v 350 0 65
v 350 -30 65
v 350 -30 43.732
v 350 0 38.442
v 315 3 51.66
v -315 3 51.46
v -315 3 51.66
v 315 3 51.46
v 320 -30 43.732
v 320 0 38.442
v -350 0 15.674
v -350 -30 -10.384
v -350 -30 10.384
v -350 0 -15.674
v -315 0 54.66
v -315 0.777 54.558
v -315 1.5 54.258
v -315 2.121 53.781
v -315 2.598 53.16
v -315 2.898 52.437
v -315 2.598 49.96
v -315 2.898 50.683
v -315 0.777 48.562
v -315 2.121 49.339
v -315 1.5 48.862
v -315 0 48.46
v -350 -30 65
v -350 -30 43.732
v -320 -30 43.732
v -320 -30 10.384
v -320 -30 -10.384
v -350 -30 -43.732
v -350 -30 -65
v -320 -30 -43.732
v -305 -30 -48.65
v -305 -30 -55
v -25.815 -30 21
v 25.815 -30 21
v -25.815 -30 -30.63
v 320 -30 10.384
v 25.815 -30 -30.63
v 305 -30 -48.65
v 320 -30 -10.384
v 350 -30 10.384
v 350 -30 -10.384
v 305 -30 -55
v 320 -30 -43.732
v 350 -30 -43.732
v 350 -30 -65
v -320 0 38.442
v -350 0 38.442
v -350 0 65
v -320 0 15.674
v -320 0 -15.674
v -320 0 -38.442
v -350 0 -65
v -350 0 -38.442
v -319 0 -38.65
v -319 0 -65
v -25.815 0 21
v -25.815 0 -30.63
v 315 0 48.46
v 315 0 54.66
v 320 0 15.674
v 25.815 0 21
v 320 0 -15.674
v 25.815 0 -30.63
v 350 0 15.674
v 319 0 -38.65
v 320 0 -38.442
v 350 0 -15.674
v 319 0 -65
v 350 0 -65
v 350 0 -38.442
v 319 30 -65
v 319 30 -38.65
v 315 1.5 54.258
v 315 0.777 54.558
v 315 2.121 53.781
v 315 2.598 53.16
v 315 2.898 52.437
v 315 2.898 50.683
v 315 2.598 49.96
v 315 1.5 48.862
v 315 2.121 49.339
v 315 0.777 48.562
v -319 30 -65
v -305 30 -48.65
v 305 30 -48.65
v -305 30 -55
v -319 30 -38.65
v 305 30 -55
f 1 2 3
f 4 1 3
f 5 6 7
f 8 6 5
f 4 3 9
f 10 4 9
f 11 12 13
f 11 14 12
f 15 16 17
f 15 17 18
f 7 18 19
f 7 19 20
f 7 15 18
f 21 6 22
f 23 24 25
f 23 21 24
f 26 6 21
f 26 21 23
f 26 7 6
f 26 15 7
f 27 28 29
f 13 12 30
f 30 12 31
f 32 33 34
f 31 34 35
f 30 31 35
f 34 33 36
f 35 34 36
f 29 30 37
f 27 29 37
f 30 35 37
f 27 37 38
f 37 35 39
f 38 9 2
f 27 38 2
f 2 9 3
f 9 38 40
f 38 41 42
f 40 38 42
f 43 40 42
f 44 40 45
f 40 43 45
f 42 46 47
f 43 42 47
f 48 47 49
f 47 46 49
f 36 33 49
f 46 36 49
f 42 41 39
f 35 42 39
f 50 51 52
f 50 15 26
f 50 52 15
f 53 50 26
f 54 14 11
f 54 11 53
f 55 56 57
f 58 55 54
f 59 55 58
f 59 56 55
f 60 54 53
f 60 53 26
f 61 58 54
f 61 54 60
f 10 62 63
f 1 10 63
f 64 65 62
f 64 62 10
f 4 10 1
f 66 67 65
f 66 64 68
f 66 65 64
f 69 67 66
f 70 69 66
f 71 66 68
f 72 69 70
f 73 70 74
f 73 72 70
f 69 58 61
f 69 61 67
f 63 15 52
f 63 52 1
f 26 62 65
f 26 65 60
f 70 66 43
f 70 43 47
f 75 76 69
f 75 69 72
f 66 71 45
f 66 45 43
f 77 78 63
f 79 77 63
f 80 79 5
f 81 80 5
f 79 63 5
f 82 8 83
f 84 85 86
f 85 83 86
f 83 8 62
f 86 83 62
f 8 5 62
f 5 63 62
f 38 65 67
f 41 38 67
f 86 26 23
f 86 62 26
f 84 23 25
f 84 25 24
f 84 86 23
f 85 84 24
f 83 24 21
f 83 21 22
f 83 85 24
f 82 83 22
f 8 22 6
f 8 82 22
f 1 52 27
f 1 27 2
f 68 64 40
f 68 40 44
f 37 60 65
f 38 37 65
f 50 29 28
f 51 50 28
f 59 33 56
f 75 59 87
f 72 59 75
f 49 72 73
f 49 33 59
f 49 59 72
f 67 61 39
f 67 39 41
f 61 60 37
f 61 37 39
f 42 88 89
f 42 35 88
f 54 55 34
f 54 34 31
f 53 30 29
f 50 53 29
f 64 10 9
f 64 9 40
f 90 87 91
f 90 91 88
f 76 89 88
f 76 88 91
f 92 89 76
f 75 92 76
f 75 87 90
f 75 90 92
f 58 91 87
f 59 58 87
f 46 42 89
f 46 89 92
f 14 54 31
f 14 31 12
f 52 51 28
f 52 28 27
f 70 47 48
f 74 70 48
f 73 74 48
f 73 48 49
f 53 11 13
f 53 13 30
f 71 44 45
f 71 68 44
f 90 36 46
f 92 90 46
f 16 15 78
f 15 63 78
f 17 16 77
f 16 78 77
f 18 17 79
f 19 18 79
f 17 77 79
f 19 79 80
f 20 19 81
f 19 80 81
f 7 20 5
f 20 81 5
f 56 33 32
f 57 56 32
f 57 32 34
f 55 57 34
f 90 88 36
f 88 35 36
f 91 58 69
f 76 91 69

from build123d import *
from OCP.BRepFilletAPI import BRepFilletAPI_MakeChamfer

# Parameters (mm, degrees)
SKETCH2_W           = 51.63
SKETCH2_H           = 51.63
SKETCH2_W_2         = 610
SKETCH2_H_2         = 6.35
BOSS_EXTRUDE1_DEPTH = 30
SKETCH2_4_W         = 630
SKETCH2_4_H         = 6.2
BOSS_EXTRUDE3_DEPTH = 3
FILLET2_R           = 3
CHAMFER1_SIZE       = 30
CHAMFER1_SIZE_2     = 5.289809421
CHAMFER2_SIZE       = 30
CHAMFER2_SIZE_2     = 5.289809421
SKETCH2_7_W         = 638
SKETCH2_7_H         = 26.35
SKETCH2_7_W_2       = 610
SKETCH2_7_H_2       = 6.35
BOSS_EXTRUDE5_DEPTH = 30


with BuildPart() as part:
    # Sketch2 → Boss-Extrude1 (new body)
    with BuildSketch(Plane(origin=(0, 0, 0), x_dir=(1, 0, 0), z_dir=(0, 1, 0))):
        Polygon((-350, -38.442), (-350, -65), (350, -65), (350, -38.442), (320, -38.442), (320, -15.674), (350, -15.674), (350, 15.674), (320, 15.674), (320, 38.442), (350, 38.442), (350, 65), (-350, 65), (-350, 38.442), (-320, 38.442), (-320, 15.674), (-350, 15.674), (-350, -15.674), (-320, -15.674), (-320, -38.442), align=None)
        with Locations((0, 4.815)):
            Rectangle(SKETCH2_W, SKETCH2_H, mode=Mode.SUBTRACT)
        with Locations((0, 51.825)):
            Rectangle(SKETCH2_W_2, SKETCH2_H_2, mode=Mode.SUBTRACT)
    extrude(amount=-BOSS_EXTRUDE1_DEPTH)

    # Sketch2<4> → Boss-Extrude3 (add)
    with BuildSketch(Plane(origin=(0, 0, 0), x_dir=(1, 0, 0), z_dir=(0, 1, 0))):
        with Locations((0, -51.56)):
            Rectangle(SKETCH2_4_W, SKETCH2_4_H)
    extrude(amount=BOSS_EXTRUDE3_DEPTH)

    # Fillet2
    fillet2_edges = [part.edges().sort_by_distance(p)[0] for p in [
        (0, 3, 48.46),
        (0, 3, 54.66),
    ]]
    fillet(fillet2_edges, radius=FILLET2_R - 0.0001)  # a hair under: the kernel refuses the full size

    # Chamfer1
    chamfer1_edges_1 = [part.edges().sort_by_distance(p)[0] for p in [
        (-335, -30, 15.674),
    ]]
    chamfer1_side_1 = [part.faces().sort_by_distance(p)[0] for p in [
        (-335, -29.894203812, 15.674),
    ]]
    chamfer1_edges_2 = [part.edges().sort_by_distance(p)[0] for p in [
        (-335, -30, -38.442),
    ]]
    chamfer1_side_2 = [part.faces().sort_by_distance(p)[0] for p in [
        (-335, -29.894203812, -38.442),
    ]]
    chamfer1_edges_3 = [part.edges().sort_by_distance(p)[0] for p in [
        (335, -30, -15.674),
    ]]
    chamfer1_side_3 = [part.faces().sort_by_distance(p)[0] for p in [
        (335, -29.894203812, -15.674),
    ]]
    chamfer1_edges_4 = [part.edges().sort_by_distance(p)[0] for p in [
        (335, -30, 38.442),
    ]]
    chamfer1_side_4 = [part.faces().sort_by_distance(p)[0] for p in [
        (335, -29.894203812, 38.442),
    ]]
    chamfer1 = BRepFilletAPI_MakeChamfer(part.part.solid().wrapped)
    for e in chamfer1_edges_1:
        chamfer1.Add(CHAMFER1_SIZE - 0.0001, CHAMFER1_SIZE_2 - 0.0001, e.wrapped, chamfer1_side_1[0].wrapped)
    for e in chamfer1_edges_2:
        chamfer1.Add(CHAMFER1_SIZE - 0.0001, CHAMFER1_SIZE_2 - 0.0001, e.wrapped, chamfer1_side_2[0].wrapped)
    for e in chamfer1_edges_3:
        chamfer1.Add(CHAMFER1_SIZE - 0.0001, CHAMFER1_SIZE_2 - 0.0001, e.wrapped, chamfer1_side_3[0].wrapped)
    for e in chamfer1_edges_4:
        chamfer1.Add(CHAMFER1_SIZE - 0.0001, CHAMFER1_SIZE_2 - 0.0001, e.wrapped, chamfer1_side_4[0].wrapped)
    add(Compound.cast(chamfer1.Shape()), mode=Mode.REPLACE)  # a hair under: the kernel refuses the full size

    # Chamfer2
    chamfer2_edges_1 = [part.edges().sort_by_distance(p)[0] for p in [
        (-335, -30, 38.442),
    ]]
    chamfer2_side_1 = [part.faces().sort_by_distance(p)[0] for p in [
        (-335, -29.894203812, 38.442),
    ]]
    chamfer2_edges_2 = [part.edges().sort_by_distance(p)[0] for p in [
        (-335, -30, -15.674),
    ]]
    chamfer2_side_2 = [part.faces().sort_by_distance(p)[0] for p in [
        (-335, -29.894203812, -15.674),
    ]]
    chamfer2_edges_3 = [part.edges().sort_by_distance(p)[0] for p in [
        (335, -30, -38.442),
    ]]
    chamfer2_side_3 = [part.faces().sort_by_distance(p)[0] for p in [
        (335, -29.894203812, -38.442),
    ]]
    chamfer2_edges_4 = [part.edges().sort_by_distance(p)[0] for p in [
        (335, -30, 15.674),
    ]]
    chamfer2_side_4 = [part.faces().sort_by_distance(p)[0] for p in [
        (335, -29.894203812, 15.674),
    ]]
    chamfer2 = BRepFilletAPI_MakeChamfer(part.part.solid().wrapped)
    for e in chamfer2_edges_1:
        chamfer2.Add(CHAMFER2_SIZE - 0.0001, CHAMFER2_SIZE_2 - 0.0001, e.wrapped, chamfer2_side_1[0].wrapped)
    for e in chamfer2_edges_2:
        chamfer2.Add(CHAMFER2_SIZE - 0.0001, CHAMFER2_SIZE_2 - 0.0001, e.wrapped, chamfer2_side_2[0].wrapped)
    for e in chamfer2_edges_3:
        chamfer2.Add(CHAMFER2_SIZE - 0.0001, CHAMFER2_SIZE_2 - 0.0001, e.wrapped, chamfer2_side_3[0].wrapped)
    for e in chamfer2_edges_4:
        chamfer2.Add(CHAMFER2_SIZE - 0.0001, CHAMFER2_SIZE_2 - 0.0001, e.wrapped, chamfer2_side_4[0].wrapped)
    add(Compound.cast(chamfer2.Shape()), mode=Mode.REPLACE)  # a hair under: the kernel refuses the full size

    # Sketch2<7> → Boss-Extrude5 (add)
    with BuildSketch(Plane(origin=(0, 0, 0), x_dir=(1, 0, 0), z_dir=(0, 1, 0))):
        with Locations((0, 51.825)):
            Rectangle(SKETCH2_7_W, SKETCH2_7_H)
        with Locations((0, 51.825)):
            Rectangle(SKETCH2_7_W_2, SKETCH2_7_H_2, mode=Mode.SUBTRACT)
    extrude(amount=BOSS_EXTRUDE5_DEPTH)


solid = part.part
